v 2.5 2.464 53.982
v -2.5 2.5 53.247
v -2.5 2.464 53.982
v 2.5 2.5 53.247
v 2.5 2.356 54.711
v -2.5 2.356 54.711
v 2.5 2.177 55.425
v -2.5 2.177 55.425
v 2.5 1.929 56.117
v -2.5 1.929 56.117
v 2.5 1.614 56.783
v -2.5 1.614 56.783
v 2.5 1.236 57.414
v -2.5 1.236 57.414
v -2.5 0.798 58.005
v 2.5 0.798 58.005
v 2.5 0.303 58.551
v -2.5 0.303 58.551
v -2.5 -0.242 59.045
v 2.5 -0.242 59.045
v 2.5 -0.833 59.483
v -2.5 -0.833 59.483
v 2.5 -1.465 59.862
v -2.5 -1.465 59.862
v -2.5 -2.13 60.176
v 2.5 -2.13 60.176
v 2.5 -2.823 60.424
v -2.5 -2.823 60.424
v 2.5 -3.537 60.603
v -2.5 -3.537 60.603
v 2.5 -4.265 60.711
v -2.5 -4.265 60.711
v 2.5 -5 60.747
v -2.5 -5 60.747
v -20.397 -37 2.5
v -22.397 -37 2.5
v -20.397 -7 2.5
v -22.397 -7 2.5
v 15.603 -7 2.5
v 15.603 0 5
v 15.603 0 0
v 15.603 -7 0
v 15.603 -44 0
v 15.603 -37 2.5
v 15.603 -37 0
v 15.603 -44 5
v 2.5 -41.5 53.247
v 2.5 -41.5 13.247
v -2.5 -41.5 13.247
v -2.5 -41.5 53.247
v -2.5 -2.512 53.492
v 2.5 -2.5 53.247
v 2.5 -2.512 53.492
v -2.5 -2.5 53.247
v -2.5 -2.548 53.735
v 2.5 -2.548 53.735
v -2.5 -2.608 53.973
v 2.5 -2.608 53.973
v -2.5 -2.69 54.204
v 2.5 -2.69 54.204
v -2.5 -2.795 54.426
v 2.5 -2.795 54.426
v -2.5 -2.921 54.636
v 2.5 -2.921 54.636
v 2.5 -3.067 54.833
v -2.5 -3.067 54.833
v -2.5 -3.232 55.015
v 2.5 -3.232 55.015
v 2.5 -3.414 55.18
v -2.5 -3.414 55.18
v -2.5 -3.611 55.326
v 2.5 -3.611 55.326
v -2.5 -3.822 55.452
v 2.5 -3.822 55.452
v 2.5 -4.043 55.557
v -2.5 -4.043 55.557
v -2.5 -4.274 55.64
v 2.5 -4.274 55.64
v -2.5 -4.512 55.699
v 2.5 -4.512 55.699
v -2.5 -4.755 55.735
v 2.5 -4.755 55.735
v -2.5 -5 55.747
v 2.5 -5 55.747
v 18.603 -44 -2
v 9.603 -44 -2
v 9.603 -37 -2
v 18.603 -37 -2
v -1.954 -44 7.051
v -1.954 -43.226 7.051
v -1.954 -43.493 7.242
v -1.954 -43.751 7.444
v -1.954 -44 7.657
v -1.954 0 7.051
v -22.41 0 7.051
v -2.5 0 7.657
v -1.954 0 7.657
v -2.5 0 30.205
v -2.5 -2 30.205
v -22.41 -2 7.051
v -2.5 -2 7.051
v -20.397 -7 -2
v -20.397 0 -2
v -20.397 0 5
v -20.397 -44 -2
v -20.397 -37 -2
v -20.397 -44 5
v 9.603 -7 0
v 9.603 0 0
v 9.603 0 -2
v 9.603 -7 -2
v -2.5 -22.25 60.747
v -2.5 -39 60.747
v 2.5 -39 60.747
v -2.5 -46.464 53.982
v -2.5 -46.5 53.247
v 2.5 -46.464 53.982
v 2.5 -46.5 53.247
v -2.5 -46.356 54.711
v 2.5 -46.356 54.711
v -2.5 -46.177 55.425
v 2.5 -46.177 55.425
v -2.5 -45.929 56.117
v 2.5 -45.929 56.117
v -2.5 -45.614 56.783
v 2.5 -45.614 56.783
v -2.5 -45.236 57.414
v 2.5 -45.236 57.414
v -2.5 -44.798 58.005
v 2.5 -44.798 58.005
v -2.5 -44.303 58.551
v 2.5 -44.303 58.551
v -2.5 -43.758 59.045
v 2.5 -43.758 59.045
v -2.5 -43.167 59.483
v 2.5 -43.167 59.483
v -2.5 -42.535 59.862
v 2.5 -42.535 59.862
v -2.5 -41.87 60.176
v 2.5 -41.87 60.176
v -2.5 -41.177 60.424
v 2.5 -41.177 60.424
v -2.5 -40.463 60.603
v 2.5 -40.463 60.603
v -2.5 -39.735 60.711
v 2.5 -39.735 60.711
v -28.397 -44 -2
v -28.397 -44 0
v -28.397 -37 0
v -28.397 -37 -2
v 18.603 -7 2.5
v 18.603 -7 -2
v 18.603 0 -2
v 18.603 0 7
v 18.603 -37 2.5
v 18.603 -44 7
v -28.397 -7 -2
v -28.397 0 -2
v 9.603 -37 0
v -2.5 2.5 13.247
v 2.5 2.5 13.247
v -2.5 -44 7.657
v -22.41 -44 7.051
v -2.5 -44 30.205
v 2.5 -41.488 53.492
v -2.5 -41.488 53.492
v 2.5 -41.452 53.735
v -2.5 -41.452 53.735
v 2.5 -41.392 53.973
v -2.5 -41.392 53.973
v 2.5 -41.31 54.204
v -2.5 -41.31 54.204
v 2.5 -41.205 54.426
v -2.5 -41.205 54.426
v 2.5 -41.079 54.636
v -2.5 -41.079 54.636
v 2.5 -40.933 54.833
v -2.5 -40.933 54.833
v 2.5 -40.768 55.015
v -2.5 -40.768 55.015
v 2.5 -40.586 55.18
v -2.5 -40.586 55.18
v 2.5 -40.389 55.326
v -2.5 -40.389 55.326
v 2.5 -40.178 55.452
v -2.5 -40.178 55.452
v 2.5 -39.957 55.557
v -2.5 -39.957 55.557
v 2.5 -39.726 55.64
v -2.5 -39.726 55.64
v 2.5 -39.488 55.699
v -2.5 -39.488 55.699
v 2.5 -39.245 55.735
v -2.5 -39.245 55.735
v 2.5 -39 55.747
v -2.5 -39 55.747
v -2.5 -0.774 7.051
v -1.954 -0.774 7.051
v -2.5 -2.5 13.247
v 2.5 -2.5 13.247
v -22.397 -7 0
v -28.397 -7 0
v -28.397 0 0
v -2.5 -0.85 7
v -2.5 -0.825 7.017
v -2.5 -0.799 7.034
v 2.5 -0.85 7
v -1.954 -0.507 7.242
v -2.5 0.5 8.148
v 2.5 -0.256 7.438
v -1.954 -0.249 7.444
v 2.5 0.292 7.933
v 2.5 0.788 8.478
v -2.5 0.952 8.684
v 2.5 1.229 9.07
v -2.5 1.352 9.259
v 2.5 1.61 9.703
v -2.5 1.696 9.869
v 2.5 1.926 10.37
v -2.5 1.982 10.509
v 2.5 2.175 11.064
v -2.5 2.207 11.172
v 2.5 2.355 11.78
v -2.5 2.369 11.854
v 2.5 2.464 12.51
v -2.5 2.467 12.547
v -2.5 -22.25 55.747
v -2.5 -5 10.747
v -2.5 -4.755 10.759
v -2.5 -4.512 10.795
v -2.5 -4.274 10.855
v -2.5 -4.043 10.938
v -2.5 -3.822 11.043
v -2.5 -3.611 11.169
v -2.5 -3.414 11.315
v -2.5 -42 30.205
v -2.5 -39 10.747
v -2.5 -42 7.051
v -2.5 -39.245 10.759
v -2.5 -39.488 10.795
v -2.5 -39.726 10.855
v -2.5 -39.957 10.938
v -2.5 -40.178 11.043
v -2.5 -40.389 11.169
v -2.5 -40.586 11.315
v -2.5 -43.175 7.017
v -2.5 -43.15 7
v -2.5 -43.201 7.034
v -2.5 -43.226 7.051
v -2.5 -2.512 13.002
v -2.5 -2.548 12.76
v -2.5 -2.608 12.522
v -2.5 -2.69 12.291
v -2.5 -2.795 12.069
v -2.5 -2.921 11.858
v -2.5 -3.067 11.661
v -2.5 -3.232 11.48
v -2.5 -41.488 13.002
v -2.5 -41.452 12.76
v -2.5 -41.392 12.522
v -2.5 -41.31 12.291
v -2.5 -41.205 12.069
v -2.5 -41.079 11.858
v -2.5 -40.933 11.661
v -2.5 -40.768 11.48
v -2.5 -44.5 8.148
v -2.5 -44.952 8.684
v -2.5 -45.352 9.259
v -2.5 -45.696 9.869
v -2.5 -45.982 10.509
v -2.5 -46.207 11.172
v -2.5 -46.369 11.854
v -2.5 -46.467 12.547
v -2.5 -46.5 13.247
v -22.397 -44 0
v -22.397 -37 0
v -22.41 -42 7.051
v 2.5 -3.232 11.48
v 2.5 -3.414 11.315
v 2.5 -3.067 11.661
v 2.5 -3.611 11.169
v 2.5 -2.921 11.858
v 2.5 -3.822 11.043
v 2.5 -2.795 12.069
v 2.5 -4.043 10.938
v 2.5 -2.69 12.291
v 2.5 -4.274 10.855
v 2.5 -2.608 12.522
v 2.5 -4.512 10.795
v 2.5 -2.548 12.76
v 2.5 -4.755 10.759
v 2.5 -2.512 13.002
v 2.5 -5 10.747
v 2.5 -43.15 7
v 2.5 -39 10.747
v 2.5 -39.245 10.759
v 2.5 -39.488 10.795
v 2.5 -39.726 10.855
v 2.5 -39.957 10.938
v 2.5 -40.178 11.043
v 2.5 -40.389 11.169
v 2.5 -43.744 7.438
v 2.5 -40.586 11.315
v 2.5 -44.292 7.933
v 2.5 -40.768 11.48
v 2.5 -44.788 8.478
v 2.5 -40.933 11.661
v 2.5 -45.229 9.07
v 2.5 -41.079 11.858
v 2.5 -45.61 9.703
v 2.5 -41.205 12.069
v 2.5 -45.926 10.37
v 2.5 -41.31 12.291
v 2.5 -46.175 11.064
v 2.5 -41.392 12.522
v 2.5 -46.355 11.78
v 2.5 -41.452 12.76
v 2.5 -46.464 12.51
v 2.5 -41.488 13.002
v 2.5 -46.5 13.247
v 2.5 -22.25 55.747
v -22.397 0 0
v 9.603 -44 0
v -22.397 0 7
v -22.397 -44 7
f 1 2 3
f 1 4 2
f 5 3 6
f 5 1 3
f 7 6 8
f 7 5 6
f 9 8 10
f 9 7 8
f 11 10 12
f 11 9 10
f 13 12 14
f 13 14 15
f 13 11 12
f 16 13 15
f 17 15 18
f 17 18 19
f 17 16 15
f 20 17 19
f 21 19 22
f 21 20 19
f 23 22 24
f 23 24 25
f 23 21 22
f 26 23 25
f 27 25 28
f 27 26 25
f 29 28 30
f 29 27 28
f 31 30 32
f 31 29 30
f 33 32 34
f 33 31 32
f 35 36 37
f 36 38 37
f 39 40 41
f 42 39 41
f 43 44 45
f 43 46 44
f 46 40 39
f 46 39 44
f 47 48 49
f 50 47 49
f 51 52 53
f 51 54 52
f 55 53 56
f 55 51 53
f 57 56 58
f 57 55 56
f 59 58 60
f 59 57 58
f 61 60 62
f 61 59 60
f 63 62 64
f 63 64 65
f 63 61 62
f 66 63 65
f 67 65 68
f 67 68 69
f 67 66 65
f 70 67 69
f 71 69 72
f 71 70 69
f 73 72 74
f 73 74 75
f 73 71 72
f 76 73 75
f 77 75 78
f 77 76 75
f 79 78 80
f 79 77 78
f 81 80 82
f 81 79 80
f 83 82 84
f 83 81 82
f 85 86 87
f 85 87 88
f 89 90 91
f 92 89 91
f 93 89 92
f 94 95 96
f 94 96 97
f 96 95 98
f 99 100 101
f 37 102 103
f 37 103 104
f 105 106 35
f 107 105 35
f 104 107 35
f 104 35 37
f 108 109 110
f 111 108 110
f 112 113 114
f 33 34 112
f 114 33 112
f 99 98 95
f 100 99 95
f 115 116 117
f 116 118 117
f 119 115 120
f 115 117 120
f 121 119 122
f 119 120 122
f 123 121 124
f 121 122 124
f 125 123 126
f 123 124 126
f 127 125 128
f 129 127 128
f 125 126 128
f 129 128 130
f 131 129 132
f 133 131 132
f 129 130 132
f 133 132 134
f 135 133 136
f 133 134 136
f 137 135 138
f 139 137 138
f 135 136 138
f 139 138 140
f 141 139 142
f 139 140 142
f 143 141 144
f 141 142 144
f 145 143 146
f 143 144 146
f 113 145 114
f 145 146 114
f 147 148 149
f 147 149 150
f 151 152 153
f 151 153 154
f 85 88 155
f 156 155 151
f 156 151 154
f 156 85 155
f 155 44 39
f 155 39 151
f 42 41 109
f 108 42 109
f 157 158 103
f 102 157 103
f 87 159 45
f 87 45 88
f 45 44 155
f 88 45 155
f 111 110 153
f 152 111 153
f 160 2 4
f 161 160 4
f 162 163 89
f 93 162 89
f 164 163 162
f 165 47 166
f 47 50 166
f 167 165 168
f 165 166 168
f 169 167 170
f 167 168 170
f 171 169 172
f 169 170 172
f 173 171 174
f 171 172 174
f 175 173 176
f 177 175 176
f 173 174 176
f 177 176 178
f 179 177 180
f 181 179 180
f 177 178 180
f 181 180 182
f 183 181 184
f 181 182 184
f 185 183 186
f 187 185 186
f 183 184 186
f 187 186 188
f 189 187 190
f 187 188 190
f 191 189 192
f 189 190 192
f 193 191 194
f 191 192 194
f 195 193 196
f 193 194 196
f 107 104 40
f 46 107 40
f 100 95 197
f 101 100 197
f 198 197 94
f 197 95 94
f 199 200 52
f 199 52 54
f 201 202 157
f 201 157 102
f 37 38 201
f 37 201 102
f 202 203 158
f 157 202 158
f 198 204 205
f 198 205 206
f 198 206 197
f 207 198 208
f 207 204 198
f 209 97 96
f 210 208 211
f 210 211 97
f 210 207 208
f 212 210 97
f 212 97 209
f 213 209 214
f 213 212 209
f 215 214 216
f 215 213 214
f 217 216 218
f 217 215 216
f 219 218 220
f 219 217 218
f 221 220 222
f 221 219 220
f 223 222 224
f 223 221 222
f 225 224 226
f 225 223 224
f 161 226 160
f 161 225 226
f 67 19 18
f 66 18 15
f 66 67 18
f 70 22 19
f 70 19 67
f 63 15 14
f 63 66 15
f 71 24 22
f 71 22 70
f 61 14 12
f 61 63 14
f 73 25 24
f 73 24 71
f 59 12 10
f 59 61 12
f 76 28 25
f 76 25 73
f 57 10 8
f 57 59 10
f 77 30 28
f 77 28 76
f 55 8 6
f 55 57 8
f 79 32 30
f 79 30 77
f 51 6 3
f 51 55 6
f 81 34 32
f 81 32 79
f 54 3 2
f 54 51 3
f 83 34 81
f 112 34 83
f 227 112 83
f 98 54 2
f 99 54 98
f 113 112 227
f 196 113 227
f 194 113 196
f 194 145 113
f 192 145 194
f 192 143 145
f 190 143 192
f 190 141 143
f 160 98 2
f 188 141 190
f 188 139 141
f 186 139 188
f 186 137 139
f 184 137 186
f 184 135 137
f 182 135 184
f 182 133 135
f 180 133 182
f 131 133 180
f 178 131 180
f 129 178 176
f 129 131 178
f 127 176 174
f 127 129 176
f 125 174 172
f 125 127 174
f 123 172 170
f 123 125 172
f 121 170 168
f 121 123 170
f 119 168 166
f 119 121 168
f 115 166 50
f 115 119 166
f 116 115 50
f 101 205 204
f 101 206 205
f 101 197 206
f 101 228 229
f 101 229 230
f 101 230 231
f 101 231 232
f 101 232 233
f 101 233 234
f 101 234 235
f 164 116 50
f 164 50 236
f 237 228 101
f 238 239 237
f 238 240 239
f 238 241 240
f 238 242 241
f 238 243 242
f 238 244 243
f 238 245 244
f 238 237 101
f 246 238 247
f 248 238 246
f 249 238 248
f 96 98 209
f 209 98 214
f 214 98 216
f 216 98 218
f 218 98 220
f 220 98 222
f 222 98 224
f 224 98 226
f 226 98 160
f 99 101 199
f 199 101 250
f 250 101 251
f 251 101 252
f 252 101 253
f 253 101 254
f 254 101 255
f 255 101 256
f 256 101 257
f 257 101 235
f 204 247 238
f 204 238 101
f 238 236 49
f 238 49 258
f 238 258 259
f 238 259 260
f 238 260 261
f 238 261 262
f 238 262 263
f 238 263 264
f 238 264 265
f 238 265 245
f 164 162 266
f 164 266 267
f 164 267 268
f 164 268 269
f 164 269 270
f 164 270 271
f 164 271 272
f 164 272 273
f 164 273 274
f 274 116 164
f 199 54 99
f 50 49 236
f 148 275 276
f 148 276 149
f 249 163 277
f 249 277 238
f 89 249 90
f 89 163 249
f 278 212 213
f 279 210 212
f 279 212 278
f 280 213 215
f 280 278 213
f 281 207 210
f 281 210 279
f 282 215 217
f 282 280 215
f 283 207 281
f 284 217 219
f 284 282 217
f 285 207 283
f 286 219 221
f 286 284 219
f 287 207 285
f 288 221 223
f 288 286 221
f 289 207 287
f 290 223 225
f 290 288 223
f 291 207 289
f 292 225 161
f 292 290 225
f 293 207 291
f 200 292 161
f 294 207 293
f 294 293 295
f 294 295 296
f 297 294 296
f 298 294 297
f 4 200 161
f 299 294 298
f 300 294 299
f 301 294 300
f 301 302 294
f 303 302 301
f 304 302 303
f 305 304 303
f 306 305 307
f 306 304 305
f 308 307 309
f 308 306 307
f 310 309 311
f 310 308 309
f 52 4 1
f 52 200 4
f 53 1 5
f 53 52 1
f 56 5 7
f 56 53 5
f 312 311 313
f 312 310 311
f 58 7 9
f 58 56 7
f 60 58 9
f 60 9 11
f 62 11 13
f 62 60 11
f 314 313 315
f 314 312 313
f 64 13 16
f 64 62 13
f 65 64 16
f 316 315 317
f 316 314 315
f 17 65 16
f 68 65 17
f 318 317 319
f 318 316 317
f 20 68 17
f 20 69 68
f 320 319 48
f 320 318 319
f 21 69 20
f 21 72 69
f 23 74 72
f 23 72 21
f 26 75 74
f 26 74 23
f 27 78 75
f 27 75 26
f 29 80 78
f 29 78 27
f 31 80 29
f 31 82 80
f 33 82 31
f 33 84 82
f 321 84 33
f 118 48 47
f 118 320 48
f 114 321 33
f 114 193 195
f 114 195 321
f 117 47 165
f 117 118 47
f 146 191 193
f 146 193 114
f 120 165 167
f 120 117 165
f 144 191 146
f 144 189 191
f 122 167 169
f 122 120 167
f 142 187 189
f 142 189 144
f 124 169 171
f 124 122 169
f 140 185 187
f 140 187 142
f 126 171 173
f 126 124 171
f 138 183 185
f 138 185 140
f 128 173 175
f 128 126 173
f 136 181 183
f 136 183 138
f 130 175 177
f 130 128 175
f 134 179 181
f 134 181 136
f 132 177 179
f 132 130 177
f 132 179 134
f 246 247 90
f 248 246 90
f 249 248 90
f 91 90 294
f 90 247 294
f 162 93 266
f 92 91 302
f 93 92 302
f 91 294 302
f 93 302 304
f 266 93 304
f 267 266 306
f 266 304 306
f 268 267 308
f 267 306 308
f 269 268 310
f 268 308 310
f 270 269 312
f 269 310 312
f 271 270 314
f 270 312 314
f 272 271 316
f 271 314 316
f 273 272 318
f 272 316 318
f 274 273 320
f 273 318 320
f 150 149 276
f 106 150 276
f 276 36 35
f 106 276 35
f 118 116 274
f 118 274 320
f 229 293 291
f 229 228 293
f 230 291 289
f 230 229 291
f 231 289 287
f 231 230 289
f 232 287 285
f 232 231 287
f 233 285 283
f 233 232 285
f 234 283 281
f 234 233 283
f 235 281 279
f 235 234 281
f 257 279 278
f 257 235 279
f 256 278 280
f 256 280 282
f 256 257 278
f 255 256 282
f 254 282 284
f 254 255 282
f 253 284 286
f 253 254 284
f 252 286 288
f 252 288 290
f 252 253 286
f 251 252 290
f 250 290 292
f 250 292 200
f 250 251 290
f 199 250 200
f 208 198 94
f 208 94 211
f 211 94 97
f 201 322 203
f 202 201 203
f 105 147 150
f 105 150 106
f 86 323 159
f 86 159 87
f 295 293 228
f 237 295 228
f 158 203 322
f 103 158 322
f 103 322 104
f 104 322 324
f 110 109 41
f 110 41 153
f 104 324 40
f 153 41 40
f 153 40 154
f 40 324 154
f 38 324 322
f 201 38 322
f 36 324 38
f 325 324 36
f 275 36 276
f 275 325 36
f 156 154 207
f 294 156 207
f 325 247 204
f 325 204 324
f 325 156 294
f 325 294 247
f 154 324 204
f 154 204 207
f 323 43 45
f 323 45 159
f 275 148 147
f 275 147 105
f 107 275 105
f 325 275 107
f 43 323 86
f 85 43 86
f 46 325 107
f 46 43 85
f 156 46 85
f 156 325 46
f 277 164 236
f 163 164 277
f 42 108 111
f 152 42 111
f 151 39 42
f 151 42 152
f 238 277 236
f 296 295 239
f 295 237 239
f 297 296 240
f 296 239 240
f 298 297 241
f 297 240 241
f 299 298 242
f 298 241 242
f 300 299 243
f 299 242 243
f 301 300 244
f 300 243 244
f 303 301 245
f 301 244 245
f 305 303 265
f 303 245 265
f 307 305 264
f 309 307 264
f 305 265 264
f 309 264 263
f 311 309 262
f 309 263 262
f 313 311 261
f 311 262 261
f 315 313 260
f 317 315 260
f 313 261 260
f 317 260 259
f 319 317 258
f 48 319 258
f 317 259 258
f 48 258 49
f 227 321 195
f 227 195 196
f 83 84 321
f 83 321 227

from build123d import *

# Parameters (mm, degrees)
F1_DEPTH = 22
F2_W     = 2
F2_H     = 2.5
F2_W_2   = 3
F4_DEPTH = 15
F6_W     = 5
F6_H     = 5
F9_DEPTH = 2


with BuildPart() as f1:
    # F0 (on Front) → F1 (new body)
    with BuildSketch(Plane.XZ):
        Polygon((-22.3971781656, 0), (-28.3971781656, 0), (-28.3971781656, -2), (-20.3971781656, -2), (-20.3971781656, 5), (13.6028218344, 5), (15.6028218344, 5), (15.6028218344, 0), (9.6028218344, 0), (9.6028218344, -2), (18.6028218344, -2), (18.6028218344, 7), (-22.3971781656, 7), align=None)
    extrude(amount=F1_DEPTH)

    # F2 (on face) → F4 (cut)
    with BuildSketch(Plane.XZ.offset(22)):
        Polygon((-20.3971781656, 0), (-22.3971781656, 0), (-28.3971781656, 0), (-28.3971781656, -2), (-20.3971781656, -2), align=None)
        Polygon((18.6028218344, -2), (18.6028218344, 0), (15.6028218344, 0), (9.6028218344, 0), (9.6028218344, -2), align=None)
        with Locations((-21.3971781656, 1.25)):
            Rectangle(F2_W, F2_H)
        with Locations((17.1028218344, 1.25)):
            Rectangle(F2_W_2, F2_H)
    extrude(amount=-F4_DEPTH, mode=Mode.SUBTRACT)

    # F7: sweep along a path in F3
    with BuildLine(Plane.YZ) as f7_path:
        Line((-22.250123322, 8.247365728), (-5, 8.247365728))
        ThreePointArc((-5, 8.247365728), (-1.4644660941, 9.7118318221), (0, 13.247365728))
        Line((0, 13.247365728), (0, 53.247365728))
        ThreePointArc((0, 53.247365728), (-1.4644660941, 56.782899634), (-5, 58.247365728))
        Line((-5, 58.247365728), (-22.250123322, 58.247365728))
    # F6 (on offset) → F7 (sweep)
    with BuildSketch(Plane.XZ.offset(22)):
        with Locations((0, 8.247365728)):
            Rectangle(F6_W, F6_H)
    sweep(path=f7_path.line)

    # F8 (on Front) → F9 (join)
    with BuildSketch(Plane.XZ):
        Polygon((-1.9540686626, 30.8402627707), (-22.409658879, 7.0511708036), (-1.9540686626, 7.0511708036), align=None)
    extrude(amount=F9_DEPTH)

    # F10: F1 across plane


with BuildPart() as f1_1:
    add(f1.part)
    add(f1.part.mirror(Plane.XZ.offset(22)))


solid = f1_1.part
